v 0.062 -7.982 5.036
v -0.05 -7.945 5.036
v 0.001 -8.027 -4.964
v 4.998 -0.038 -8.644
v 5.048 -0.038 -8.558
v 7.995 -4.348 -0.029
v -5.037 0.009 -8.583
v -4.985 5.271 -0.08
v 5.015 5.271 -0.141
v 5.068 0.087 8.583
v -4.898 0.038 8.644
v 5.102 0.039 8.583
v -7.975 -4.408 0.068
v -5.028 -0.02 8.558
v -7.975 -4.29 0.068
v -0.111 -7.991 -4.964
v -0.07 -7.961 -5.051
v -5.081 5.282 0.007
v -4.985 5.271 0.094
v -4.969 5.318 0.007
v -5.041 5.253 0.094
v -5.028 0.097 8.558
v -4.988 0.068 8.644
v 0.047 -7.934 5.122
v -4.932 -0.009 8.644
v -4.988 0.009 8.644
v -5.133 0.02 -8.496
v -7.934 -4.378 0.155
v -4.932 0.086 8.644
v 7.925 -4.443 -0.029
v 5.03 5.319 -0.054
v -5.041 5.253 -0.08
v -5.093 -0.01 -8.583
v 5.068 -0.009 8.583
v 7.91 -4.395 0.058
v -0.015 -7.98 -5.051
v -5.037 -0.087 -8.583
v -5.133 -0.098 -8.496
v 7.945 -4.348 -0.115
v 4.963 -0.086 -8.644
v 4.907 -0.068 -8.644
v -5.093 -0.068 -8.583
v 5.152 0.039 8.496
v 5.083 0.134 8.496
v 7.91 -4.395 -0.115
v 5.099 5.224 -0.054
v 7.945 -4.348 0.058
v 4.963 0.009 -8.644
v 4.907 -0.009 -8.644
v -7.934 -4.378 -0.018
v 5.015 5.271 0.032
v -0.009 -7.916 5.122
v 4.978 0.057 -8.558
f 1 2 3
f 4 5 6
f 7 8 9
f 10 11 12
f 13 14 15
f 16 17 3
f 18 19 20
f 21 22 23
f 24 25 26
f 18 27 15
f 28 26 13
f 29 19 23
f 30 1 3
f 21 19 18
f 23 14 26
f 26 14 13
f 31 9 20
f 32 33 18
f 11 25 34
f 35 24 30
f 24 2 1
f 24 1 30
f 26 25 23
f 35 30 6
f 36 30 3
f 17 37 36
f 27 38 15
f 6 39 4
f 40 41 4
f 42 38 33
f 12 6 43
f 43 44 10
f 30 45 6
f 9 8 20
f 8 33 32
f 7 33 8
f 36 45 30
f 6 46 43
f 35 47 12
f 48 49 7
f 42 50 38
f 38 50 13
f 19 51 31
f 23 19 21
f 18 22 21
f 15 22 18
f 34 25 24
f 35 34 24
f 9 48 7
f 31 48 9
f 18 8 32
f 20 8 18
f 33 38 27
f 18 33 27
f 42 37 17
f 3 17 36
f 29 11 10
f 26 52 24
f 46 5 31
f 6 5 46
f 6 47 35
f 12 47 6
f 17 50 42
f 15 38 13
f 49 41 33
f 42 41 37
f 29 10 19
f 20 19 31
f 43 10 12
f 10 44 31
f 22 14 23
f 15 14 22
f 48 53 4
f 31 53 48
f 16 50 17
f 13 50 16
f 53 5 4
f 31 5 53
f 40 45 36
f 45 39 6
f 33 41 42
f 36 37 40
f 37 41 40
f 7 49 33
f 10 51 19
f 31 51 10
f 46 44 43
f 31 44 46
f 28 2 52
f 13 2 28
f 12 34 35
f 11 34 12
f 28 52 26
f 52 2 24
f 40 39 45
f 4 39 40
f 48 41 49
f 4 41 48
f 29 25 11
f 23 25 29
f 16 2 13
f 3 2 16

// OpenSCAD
// Auto-generated OpenSCAD file

    inner_points = 10*[[-0.49475772011132046, 0.003839472954238088, 0.8557705860181677], [0.505223446776251, 0.0038995730095640058, 0.8496336276384451], [-0.505223446776251, -0.0038995730095640058, -0.8496336276384451], [0.49475772011132046, -0.003839472954238088, -0.8557705860181677], [0.003137871696801686, -0.788661439733275, 0.5035742160091927], [-0.002998750789873661, -0.7931992616167778, -0.49639665858516746], [-0.5000365230269928, 0.5223214995430275, 0.0006983537803530961], [0.4999446438605786, 0.5223815995983536, -0.00543860459936947], [-0.789374516264686, -0.4348859382371884, 0.006817726903340358], [0.7894510022985628, -0.43479104894911214, -0.0028716420739015092]];

    outer_points = 10*[[0.8526836986618631, 0.4907220093236373, 0.09625829137218865], [0.8527700142393673, -0.4907220093236373, -0.09549058296899036], [-0.8527700142393673, 0.4907220093236373, 0.09549058296899036], [-0.8526836986618631, -0.4907220093236373, -0.09625829137218865], [0.49965051582430237, -0.15166158156646264, 0.7764868514685156], [-0.5003493828586203, -0.15166158156646264, 0.7760367024438842], [0.00018761744828893297, 0.5908833725510971, -0.4167895941433019], [0.00027393302579300583, -0.3905606460961775, -0.6085384684844809], [-0.0002602518163823537, 0.6913983635916522, 0.578145848983155], [-0.0001239720133965481, -0.8581596810908002, 0.27540213141105363]];

    // Convex hull for inner set (I)
    module inner_hull() {
        hull() {
            for (p = inner_points) {
                translate(p) sphere(r=0.1);
            }
        }
    }

    // Convex hull for outer set (O) minus inner hull (O \ I)
    module outer_minus_inner() {
        difference() {
            hull() {
                for (p = outer_points) {
                    translate(p) sphere(r=0.1);
                }
            }
            inner_hull(); // Subtract inner hull
        }
    }

    // Convex hull for outer set (O) minus all translated inner hulls
    module outer_minus_AllTranslationInner() {
        difference() {
            hull() {
                for (p = outer_points) {
                    translate(p) sphere(r=0.1);
                }
            }
            hull() {
                translate([0,0,50]) inner_hull();
                translate([0,0,-50]) inner_hull();
            }; // Subtract translated inner hulls
        }
    }

    // Difference between outer_minus_inner and outer_minus_AllTranslationInner
    module outer_minus_inner_diff() {
        difference() {
            // Outer minus inner
            difference() {
                hull() {
                    for (p = outer_points) {
                        translate(p) sphere(r=0.1);
                    }
                }
                inner_hull();
            }

            // Subtract Outer minus AllTranslationInner
            difference() {
                hull() {
                    for (p = outer_points) {
                        translate(p) sphere(r=0.1);
                    }
                }
                hull() {
                    translate([0,0,50]) inner_hull();
                    translate([0,0,-50]) inner_hull();
                };
            }
        }
    }

    // Rendering all with colors applied
    color([1, 0, 0, 0.5]) inner_hull(); // Transparent red
    
